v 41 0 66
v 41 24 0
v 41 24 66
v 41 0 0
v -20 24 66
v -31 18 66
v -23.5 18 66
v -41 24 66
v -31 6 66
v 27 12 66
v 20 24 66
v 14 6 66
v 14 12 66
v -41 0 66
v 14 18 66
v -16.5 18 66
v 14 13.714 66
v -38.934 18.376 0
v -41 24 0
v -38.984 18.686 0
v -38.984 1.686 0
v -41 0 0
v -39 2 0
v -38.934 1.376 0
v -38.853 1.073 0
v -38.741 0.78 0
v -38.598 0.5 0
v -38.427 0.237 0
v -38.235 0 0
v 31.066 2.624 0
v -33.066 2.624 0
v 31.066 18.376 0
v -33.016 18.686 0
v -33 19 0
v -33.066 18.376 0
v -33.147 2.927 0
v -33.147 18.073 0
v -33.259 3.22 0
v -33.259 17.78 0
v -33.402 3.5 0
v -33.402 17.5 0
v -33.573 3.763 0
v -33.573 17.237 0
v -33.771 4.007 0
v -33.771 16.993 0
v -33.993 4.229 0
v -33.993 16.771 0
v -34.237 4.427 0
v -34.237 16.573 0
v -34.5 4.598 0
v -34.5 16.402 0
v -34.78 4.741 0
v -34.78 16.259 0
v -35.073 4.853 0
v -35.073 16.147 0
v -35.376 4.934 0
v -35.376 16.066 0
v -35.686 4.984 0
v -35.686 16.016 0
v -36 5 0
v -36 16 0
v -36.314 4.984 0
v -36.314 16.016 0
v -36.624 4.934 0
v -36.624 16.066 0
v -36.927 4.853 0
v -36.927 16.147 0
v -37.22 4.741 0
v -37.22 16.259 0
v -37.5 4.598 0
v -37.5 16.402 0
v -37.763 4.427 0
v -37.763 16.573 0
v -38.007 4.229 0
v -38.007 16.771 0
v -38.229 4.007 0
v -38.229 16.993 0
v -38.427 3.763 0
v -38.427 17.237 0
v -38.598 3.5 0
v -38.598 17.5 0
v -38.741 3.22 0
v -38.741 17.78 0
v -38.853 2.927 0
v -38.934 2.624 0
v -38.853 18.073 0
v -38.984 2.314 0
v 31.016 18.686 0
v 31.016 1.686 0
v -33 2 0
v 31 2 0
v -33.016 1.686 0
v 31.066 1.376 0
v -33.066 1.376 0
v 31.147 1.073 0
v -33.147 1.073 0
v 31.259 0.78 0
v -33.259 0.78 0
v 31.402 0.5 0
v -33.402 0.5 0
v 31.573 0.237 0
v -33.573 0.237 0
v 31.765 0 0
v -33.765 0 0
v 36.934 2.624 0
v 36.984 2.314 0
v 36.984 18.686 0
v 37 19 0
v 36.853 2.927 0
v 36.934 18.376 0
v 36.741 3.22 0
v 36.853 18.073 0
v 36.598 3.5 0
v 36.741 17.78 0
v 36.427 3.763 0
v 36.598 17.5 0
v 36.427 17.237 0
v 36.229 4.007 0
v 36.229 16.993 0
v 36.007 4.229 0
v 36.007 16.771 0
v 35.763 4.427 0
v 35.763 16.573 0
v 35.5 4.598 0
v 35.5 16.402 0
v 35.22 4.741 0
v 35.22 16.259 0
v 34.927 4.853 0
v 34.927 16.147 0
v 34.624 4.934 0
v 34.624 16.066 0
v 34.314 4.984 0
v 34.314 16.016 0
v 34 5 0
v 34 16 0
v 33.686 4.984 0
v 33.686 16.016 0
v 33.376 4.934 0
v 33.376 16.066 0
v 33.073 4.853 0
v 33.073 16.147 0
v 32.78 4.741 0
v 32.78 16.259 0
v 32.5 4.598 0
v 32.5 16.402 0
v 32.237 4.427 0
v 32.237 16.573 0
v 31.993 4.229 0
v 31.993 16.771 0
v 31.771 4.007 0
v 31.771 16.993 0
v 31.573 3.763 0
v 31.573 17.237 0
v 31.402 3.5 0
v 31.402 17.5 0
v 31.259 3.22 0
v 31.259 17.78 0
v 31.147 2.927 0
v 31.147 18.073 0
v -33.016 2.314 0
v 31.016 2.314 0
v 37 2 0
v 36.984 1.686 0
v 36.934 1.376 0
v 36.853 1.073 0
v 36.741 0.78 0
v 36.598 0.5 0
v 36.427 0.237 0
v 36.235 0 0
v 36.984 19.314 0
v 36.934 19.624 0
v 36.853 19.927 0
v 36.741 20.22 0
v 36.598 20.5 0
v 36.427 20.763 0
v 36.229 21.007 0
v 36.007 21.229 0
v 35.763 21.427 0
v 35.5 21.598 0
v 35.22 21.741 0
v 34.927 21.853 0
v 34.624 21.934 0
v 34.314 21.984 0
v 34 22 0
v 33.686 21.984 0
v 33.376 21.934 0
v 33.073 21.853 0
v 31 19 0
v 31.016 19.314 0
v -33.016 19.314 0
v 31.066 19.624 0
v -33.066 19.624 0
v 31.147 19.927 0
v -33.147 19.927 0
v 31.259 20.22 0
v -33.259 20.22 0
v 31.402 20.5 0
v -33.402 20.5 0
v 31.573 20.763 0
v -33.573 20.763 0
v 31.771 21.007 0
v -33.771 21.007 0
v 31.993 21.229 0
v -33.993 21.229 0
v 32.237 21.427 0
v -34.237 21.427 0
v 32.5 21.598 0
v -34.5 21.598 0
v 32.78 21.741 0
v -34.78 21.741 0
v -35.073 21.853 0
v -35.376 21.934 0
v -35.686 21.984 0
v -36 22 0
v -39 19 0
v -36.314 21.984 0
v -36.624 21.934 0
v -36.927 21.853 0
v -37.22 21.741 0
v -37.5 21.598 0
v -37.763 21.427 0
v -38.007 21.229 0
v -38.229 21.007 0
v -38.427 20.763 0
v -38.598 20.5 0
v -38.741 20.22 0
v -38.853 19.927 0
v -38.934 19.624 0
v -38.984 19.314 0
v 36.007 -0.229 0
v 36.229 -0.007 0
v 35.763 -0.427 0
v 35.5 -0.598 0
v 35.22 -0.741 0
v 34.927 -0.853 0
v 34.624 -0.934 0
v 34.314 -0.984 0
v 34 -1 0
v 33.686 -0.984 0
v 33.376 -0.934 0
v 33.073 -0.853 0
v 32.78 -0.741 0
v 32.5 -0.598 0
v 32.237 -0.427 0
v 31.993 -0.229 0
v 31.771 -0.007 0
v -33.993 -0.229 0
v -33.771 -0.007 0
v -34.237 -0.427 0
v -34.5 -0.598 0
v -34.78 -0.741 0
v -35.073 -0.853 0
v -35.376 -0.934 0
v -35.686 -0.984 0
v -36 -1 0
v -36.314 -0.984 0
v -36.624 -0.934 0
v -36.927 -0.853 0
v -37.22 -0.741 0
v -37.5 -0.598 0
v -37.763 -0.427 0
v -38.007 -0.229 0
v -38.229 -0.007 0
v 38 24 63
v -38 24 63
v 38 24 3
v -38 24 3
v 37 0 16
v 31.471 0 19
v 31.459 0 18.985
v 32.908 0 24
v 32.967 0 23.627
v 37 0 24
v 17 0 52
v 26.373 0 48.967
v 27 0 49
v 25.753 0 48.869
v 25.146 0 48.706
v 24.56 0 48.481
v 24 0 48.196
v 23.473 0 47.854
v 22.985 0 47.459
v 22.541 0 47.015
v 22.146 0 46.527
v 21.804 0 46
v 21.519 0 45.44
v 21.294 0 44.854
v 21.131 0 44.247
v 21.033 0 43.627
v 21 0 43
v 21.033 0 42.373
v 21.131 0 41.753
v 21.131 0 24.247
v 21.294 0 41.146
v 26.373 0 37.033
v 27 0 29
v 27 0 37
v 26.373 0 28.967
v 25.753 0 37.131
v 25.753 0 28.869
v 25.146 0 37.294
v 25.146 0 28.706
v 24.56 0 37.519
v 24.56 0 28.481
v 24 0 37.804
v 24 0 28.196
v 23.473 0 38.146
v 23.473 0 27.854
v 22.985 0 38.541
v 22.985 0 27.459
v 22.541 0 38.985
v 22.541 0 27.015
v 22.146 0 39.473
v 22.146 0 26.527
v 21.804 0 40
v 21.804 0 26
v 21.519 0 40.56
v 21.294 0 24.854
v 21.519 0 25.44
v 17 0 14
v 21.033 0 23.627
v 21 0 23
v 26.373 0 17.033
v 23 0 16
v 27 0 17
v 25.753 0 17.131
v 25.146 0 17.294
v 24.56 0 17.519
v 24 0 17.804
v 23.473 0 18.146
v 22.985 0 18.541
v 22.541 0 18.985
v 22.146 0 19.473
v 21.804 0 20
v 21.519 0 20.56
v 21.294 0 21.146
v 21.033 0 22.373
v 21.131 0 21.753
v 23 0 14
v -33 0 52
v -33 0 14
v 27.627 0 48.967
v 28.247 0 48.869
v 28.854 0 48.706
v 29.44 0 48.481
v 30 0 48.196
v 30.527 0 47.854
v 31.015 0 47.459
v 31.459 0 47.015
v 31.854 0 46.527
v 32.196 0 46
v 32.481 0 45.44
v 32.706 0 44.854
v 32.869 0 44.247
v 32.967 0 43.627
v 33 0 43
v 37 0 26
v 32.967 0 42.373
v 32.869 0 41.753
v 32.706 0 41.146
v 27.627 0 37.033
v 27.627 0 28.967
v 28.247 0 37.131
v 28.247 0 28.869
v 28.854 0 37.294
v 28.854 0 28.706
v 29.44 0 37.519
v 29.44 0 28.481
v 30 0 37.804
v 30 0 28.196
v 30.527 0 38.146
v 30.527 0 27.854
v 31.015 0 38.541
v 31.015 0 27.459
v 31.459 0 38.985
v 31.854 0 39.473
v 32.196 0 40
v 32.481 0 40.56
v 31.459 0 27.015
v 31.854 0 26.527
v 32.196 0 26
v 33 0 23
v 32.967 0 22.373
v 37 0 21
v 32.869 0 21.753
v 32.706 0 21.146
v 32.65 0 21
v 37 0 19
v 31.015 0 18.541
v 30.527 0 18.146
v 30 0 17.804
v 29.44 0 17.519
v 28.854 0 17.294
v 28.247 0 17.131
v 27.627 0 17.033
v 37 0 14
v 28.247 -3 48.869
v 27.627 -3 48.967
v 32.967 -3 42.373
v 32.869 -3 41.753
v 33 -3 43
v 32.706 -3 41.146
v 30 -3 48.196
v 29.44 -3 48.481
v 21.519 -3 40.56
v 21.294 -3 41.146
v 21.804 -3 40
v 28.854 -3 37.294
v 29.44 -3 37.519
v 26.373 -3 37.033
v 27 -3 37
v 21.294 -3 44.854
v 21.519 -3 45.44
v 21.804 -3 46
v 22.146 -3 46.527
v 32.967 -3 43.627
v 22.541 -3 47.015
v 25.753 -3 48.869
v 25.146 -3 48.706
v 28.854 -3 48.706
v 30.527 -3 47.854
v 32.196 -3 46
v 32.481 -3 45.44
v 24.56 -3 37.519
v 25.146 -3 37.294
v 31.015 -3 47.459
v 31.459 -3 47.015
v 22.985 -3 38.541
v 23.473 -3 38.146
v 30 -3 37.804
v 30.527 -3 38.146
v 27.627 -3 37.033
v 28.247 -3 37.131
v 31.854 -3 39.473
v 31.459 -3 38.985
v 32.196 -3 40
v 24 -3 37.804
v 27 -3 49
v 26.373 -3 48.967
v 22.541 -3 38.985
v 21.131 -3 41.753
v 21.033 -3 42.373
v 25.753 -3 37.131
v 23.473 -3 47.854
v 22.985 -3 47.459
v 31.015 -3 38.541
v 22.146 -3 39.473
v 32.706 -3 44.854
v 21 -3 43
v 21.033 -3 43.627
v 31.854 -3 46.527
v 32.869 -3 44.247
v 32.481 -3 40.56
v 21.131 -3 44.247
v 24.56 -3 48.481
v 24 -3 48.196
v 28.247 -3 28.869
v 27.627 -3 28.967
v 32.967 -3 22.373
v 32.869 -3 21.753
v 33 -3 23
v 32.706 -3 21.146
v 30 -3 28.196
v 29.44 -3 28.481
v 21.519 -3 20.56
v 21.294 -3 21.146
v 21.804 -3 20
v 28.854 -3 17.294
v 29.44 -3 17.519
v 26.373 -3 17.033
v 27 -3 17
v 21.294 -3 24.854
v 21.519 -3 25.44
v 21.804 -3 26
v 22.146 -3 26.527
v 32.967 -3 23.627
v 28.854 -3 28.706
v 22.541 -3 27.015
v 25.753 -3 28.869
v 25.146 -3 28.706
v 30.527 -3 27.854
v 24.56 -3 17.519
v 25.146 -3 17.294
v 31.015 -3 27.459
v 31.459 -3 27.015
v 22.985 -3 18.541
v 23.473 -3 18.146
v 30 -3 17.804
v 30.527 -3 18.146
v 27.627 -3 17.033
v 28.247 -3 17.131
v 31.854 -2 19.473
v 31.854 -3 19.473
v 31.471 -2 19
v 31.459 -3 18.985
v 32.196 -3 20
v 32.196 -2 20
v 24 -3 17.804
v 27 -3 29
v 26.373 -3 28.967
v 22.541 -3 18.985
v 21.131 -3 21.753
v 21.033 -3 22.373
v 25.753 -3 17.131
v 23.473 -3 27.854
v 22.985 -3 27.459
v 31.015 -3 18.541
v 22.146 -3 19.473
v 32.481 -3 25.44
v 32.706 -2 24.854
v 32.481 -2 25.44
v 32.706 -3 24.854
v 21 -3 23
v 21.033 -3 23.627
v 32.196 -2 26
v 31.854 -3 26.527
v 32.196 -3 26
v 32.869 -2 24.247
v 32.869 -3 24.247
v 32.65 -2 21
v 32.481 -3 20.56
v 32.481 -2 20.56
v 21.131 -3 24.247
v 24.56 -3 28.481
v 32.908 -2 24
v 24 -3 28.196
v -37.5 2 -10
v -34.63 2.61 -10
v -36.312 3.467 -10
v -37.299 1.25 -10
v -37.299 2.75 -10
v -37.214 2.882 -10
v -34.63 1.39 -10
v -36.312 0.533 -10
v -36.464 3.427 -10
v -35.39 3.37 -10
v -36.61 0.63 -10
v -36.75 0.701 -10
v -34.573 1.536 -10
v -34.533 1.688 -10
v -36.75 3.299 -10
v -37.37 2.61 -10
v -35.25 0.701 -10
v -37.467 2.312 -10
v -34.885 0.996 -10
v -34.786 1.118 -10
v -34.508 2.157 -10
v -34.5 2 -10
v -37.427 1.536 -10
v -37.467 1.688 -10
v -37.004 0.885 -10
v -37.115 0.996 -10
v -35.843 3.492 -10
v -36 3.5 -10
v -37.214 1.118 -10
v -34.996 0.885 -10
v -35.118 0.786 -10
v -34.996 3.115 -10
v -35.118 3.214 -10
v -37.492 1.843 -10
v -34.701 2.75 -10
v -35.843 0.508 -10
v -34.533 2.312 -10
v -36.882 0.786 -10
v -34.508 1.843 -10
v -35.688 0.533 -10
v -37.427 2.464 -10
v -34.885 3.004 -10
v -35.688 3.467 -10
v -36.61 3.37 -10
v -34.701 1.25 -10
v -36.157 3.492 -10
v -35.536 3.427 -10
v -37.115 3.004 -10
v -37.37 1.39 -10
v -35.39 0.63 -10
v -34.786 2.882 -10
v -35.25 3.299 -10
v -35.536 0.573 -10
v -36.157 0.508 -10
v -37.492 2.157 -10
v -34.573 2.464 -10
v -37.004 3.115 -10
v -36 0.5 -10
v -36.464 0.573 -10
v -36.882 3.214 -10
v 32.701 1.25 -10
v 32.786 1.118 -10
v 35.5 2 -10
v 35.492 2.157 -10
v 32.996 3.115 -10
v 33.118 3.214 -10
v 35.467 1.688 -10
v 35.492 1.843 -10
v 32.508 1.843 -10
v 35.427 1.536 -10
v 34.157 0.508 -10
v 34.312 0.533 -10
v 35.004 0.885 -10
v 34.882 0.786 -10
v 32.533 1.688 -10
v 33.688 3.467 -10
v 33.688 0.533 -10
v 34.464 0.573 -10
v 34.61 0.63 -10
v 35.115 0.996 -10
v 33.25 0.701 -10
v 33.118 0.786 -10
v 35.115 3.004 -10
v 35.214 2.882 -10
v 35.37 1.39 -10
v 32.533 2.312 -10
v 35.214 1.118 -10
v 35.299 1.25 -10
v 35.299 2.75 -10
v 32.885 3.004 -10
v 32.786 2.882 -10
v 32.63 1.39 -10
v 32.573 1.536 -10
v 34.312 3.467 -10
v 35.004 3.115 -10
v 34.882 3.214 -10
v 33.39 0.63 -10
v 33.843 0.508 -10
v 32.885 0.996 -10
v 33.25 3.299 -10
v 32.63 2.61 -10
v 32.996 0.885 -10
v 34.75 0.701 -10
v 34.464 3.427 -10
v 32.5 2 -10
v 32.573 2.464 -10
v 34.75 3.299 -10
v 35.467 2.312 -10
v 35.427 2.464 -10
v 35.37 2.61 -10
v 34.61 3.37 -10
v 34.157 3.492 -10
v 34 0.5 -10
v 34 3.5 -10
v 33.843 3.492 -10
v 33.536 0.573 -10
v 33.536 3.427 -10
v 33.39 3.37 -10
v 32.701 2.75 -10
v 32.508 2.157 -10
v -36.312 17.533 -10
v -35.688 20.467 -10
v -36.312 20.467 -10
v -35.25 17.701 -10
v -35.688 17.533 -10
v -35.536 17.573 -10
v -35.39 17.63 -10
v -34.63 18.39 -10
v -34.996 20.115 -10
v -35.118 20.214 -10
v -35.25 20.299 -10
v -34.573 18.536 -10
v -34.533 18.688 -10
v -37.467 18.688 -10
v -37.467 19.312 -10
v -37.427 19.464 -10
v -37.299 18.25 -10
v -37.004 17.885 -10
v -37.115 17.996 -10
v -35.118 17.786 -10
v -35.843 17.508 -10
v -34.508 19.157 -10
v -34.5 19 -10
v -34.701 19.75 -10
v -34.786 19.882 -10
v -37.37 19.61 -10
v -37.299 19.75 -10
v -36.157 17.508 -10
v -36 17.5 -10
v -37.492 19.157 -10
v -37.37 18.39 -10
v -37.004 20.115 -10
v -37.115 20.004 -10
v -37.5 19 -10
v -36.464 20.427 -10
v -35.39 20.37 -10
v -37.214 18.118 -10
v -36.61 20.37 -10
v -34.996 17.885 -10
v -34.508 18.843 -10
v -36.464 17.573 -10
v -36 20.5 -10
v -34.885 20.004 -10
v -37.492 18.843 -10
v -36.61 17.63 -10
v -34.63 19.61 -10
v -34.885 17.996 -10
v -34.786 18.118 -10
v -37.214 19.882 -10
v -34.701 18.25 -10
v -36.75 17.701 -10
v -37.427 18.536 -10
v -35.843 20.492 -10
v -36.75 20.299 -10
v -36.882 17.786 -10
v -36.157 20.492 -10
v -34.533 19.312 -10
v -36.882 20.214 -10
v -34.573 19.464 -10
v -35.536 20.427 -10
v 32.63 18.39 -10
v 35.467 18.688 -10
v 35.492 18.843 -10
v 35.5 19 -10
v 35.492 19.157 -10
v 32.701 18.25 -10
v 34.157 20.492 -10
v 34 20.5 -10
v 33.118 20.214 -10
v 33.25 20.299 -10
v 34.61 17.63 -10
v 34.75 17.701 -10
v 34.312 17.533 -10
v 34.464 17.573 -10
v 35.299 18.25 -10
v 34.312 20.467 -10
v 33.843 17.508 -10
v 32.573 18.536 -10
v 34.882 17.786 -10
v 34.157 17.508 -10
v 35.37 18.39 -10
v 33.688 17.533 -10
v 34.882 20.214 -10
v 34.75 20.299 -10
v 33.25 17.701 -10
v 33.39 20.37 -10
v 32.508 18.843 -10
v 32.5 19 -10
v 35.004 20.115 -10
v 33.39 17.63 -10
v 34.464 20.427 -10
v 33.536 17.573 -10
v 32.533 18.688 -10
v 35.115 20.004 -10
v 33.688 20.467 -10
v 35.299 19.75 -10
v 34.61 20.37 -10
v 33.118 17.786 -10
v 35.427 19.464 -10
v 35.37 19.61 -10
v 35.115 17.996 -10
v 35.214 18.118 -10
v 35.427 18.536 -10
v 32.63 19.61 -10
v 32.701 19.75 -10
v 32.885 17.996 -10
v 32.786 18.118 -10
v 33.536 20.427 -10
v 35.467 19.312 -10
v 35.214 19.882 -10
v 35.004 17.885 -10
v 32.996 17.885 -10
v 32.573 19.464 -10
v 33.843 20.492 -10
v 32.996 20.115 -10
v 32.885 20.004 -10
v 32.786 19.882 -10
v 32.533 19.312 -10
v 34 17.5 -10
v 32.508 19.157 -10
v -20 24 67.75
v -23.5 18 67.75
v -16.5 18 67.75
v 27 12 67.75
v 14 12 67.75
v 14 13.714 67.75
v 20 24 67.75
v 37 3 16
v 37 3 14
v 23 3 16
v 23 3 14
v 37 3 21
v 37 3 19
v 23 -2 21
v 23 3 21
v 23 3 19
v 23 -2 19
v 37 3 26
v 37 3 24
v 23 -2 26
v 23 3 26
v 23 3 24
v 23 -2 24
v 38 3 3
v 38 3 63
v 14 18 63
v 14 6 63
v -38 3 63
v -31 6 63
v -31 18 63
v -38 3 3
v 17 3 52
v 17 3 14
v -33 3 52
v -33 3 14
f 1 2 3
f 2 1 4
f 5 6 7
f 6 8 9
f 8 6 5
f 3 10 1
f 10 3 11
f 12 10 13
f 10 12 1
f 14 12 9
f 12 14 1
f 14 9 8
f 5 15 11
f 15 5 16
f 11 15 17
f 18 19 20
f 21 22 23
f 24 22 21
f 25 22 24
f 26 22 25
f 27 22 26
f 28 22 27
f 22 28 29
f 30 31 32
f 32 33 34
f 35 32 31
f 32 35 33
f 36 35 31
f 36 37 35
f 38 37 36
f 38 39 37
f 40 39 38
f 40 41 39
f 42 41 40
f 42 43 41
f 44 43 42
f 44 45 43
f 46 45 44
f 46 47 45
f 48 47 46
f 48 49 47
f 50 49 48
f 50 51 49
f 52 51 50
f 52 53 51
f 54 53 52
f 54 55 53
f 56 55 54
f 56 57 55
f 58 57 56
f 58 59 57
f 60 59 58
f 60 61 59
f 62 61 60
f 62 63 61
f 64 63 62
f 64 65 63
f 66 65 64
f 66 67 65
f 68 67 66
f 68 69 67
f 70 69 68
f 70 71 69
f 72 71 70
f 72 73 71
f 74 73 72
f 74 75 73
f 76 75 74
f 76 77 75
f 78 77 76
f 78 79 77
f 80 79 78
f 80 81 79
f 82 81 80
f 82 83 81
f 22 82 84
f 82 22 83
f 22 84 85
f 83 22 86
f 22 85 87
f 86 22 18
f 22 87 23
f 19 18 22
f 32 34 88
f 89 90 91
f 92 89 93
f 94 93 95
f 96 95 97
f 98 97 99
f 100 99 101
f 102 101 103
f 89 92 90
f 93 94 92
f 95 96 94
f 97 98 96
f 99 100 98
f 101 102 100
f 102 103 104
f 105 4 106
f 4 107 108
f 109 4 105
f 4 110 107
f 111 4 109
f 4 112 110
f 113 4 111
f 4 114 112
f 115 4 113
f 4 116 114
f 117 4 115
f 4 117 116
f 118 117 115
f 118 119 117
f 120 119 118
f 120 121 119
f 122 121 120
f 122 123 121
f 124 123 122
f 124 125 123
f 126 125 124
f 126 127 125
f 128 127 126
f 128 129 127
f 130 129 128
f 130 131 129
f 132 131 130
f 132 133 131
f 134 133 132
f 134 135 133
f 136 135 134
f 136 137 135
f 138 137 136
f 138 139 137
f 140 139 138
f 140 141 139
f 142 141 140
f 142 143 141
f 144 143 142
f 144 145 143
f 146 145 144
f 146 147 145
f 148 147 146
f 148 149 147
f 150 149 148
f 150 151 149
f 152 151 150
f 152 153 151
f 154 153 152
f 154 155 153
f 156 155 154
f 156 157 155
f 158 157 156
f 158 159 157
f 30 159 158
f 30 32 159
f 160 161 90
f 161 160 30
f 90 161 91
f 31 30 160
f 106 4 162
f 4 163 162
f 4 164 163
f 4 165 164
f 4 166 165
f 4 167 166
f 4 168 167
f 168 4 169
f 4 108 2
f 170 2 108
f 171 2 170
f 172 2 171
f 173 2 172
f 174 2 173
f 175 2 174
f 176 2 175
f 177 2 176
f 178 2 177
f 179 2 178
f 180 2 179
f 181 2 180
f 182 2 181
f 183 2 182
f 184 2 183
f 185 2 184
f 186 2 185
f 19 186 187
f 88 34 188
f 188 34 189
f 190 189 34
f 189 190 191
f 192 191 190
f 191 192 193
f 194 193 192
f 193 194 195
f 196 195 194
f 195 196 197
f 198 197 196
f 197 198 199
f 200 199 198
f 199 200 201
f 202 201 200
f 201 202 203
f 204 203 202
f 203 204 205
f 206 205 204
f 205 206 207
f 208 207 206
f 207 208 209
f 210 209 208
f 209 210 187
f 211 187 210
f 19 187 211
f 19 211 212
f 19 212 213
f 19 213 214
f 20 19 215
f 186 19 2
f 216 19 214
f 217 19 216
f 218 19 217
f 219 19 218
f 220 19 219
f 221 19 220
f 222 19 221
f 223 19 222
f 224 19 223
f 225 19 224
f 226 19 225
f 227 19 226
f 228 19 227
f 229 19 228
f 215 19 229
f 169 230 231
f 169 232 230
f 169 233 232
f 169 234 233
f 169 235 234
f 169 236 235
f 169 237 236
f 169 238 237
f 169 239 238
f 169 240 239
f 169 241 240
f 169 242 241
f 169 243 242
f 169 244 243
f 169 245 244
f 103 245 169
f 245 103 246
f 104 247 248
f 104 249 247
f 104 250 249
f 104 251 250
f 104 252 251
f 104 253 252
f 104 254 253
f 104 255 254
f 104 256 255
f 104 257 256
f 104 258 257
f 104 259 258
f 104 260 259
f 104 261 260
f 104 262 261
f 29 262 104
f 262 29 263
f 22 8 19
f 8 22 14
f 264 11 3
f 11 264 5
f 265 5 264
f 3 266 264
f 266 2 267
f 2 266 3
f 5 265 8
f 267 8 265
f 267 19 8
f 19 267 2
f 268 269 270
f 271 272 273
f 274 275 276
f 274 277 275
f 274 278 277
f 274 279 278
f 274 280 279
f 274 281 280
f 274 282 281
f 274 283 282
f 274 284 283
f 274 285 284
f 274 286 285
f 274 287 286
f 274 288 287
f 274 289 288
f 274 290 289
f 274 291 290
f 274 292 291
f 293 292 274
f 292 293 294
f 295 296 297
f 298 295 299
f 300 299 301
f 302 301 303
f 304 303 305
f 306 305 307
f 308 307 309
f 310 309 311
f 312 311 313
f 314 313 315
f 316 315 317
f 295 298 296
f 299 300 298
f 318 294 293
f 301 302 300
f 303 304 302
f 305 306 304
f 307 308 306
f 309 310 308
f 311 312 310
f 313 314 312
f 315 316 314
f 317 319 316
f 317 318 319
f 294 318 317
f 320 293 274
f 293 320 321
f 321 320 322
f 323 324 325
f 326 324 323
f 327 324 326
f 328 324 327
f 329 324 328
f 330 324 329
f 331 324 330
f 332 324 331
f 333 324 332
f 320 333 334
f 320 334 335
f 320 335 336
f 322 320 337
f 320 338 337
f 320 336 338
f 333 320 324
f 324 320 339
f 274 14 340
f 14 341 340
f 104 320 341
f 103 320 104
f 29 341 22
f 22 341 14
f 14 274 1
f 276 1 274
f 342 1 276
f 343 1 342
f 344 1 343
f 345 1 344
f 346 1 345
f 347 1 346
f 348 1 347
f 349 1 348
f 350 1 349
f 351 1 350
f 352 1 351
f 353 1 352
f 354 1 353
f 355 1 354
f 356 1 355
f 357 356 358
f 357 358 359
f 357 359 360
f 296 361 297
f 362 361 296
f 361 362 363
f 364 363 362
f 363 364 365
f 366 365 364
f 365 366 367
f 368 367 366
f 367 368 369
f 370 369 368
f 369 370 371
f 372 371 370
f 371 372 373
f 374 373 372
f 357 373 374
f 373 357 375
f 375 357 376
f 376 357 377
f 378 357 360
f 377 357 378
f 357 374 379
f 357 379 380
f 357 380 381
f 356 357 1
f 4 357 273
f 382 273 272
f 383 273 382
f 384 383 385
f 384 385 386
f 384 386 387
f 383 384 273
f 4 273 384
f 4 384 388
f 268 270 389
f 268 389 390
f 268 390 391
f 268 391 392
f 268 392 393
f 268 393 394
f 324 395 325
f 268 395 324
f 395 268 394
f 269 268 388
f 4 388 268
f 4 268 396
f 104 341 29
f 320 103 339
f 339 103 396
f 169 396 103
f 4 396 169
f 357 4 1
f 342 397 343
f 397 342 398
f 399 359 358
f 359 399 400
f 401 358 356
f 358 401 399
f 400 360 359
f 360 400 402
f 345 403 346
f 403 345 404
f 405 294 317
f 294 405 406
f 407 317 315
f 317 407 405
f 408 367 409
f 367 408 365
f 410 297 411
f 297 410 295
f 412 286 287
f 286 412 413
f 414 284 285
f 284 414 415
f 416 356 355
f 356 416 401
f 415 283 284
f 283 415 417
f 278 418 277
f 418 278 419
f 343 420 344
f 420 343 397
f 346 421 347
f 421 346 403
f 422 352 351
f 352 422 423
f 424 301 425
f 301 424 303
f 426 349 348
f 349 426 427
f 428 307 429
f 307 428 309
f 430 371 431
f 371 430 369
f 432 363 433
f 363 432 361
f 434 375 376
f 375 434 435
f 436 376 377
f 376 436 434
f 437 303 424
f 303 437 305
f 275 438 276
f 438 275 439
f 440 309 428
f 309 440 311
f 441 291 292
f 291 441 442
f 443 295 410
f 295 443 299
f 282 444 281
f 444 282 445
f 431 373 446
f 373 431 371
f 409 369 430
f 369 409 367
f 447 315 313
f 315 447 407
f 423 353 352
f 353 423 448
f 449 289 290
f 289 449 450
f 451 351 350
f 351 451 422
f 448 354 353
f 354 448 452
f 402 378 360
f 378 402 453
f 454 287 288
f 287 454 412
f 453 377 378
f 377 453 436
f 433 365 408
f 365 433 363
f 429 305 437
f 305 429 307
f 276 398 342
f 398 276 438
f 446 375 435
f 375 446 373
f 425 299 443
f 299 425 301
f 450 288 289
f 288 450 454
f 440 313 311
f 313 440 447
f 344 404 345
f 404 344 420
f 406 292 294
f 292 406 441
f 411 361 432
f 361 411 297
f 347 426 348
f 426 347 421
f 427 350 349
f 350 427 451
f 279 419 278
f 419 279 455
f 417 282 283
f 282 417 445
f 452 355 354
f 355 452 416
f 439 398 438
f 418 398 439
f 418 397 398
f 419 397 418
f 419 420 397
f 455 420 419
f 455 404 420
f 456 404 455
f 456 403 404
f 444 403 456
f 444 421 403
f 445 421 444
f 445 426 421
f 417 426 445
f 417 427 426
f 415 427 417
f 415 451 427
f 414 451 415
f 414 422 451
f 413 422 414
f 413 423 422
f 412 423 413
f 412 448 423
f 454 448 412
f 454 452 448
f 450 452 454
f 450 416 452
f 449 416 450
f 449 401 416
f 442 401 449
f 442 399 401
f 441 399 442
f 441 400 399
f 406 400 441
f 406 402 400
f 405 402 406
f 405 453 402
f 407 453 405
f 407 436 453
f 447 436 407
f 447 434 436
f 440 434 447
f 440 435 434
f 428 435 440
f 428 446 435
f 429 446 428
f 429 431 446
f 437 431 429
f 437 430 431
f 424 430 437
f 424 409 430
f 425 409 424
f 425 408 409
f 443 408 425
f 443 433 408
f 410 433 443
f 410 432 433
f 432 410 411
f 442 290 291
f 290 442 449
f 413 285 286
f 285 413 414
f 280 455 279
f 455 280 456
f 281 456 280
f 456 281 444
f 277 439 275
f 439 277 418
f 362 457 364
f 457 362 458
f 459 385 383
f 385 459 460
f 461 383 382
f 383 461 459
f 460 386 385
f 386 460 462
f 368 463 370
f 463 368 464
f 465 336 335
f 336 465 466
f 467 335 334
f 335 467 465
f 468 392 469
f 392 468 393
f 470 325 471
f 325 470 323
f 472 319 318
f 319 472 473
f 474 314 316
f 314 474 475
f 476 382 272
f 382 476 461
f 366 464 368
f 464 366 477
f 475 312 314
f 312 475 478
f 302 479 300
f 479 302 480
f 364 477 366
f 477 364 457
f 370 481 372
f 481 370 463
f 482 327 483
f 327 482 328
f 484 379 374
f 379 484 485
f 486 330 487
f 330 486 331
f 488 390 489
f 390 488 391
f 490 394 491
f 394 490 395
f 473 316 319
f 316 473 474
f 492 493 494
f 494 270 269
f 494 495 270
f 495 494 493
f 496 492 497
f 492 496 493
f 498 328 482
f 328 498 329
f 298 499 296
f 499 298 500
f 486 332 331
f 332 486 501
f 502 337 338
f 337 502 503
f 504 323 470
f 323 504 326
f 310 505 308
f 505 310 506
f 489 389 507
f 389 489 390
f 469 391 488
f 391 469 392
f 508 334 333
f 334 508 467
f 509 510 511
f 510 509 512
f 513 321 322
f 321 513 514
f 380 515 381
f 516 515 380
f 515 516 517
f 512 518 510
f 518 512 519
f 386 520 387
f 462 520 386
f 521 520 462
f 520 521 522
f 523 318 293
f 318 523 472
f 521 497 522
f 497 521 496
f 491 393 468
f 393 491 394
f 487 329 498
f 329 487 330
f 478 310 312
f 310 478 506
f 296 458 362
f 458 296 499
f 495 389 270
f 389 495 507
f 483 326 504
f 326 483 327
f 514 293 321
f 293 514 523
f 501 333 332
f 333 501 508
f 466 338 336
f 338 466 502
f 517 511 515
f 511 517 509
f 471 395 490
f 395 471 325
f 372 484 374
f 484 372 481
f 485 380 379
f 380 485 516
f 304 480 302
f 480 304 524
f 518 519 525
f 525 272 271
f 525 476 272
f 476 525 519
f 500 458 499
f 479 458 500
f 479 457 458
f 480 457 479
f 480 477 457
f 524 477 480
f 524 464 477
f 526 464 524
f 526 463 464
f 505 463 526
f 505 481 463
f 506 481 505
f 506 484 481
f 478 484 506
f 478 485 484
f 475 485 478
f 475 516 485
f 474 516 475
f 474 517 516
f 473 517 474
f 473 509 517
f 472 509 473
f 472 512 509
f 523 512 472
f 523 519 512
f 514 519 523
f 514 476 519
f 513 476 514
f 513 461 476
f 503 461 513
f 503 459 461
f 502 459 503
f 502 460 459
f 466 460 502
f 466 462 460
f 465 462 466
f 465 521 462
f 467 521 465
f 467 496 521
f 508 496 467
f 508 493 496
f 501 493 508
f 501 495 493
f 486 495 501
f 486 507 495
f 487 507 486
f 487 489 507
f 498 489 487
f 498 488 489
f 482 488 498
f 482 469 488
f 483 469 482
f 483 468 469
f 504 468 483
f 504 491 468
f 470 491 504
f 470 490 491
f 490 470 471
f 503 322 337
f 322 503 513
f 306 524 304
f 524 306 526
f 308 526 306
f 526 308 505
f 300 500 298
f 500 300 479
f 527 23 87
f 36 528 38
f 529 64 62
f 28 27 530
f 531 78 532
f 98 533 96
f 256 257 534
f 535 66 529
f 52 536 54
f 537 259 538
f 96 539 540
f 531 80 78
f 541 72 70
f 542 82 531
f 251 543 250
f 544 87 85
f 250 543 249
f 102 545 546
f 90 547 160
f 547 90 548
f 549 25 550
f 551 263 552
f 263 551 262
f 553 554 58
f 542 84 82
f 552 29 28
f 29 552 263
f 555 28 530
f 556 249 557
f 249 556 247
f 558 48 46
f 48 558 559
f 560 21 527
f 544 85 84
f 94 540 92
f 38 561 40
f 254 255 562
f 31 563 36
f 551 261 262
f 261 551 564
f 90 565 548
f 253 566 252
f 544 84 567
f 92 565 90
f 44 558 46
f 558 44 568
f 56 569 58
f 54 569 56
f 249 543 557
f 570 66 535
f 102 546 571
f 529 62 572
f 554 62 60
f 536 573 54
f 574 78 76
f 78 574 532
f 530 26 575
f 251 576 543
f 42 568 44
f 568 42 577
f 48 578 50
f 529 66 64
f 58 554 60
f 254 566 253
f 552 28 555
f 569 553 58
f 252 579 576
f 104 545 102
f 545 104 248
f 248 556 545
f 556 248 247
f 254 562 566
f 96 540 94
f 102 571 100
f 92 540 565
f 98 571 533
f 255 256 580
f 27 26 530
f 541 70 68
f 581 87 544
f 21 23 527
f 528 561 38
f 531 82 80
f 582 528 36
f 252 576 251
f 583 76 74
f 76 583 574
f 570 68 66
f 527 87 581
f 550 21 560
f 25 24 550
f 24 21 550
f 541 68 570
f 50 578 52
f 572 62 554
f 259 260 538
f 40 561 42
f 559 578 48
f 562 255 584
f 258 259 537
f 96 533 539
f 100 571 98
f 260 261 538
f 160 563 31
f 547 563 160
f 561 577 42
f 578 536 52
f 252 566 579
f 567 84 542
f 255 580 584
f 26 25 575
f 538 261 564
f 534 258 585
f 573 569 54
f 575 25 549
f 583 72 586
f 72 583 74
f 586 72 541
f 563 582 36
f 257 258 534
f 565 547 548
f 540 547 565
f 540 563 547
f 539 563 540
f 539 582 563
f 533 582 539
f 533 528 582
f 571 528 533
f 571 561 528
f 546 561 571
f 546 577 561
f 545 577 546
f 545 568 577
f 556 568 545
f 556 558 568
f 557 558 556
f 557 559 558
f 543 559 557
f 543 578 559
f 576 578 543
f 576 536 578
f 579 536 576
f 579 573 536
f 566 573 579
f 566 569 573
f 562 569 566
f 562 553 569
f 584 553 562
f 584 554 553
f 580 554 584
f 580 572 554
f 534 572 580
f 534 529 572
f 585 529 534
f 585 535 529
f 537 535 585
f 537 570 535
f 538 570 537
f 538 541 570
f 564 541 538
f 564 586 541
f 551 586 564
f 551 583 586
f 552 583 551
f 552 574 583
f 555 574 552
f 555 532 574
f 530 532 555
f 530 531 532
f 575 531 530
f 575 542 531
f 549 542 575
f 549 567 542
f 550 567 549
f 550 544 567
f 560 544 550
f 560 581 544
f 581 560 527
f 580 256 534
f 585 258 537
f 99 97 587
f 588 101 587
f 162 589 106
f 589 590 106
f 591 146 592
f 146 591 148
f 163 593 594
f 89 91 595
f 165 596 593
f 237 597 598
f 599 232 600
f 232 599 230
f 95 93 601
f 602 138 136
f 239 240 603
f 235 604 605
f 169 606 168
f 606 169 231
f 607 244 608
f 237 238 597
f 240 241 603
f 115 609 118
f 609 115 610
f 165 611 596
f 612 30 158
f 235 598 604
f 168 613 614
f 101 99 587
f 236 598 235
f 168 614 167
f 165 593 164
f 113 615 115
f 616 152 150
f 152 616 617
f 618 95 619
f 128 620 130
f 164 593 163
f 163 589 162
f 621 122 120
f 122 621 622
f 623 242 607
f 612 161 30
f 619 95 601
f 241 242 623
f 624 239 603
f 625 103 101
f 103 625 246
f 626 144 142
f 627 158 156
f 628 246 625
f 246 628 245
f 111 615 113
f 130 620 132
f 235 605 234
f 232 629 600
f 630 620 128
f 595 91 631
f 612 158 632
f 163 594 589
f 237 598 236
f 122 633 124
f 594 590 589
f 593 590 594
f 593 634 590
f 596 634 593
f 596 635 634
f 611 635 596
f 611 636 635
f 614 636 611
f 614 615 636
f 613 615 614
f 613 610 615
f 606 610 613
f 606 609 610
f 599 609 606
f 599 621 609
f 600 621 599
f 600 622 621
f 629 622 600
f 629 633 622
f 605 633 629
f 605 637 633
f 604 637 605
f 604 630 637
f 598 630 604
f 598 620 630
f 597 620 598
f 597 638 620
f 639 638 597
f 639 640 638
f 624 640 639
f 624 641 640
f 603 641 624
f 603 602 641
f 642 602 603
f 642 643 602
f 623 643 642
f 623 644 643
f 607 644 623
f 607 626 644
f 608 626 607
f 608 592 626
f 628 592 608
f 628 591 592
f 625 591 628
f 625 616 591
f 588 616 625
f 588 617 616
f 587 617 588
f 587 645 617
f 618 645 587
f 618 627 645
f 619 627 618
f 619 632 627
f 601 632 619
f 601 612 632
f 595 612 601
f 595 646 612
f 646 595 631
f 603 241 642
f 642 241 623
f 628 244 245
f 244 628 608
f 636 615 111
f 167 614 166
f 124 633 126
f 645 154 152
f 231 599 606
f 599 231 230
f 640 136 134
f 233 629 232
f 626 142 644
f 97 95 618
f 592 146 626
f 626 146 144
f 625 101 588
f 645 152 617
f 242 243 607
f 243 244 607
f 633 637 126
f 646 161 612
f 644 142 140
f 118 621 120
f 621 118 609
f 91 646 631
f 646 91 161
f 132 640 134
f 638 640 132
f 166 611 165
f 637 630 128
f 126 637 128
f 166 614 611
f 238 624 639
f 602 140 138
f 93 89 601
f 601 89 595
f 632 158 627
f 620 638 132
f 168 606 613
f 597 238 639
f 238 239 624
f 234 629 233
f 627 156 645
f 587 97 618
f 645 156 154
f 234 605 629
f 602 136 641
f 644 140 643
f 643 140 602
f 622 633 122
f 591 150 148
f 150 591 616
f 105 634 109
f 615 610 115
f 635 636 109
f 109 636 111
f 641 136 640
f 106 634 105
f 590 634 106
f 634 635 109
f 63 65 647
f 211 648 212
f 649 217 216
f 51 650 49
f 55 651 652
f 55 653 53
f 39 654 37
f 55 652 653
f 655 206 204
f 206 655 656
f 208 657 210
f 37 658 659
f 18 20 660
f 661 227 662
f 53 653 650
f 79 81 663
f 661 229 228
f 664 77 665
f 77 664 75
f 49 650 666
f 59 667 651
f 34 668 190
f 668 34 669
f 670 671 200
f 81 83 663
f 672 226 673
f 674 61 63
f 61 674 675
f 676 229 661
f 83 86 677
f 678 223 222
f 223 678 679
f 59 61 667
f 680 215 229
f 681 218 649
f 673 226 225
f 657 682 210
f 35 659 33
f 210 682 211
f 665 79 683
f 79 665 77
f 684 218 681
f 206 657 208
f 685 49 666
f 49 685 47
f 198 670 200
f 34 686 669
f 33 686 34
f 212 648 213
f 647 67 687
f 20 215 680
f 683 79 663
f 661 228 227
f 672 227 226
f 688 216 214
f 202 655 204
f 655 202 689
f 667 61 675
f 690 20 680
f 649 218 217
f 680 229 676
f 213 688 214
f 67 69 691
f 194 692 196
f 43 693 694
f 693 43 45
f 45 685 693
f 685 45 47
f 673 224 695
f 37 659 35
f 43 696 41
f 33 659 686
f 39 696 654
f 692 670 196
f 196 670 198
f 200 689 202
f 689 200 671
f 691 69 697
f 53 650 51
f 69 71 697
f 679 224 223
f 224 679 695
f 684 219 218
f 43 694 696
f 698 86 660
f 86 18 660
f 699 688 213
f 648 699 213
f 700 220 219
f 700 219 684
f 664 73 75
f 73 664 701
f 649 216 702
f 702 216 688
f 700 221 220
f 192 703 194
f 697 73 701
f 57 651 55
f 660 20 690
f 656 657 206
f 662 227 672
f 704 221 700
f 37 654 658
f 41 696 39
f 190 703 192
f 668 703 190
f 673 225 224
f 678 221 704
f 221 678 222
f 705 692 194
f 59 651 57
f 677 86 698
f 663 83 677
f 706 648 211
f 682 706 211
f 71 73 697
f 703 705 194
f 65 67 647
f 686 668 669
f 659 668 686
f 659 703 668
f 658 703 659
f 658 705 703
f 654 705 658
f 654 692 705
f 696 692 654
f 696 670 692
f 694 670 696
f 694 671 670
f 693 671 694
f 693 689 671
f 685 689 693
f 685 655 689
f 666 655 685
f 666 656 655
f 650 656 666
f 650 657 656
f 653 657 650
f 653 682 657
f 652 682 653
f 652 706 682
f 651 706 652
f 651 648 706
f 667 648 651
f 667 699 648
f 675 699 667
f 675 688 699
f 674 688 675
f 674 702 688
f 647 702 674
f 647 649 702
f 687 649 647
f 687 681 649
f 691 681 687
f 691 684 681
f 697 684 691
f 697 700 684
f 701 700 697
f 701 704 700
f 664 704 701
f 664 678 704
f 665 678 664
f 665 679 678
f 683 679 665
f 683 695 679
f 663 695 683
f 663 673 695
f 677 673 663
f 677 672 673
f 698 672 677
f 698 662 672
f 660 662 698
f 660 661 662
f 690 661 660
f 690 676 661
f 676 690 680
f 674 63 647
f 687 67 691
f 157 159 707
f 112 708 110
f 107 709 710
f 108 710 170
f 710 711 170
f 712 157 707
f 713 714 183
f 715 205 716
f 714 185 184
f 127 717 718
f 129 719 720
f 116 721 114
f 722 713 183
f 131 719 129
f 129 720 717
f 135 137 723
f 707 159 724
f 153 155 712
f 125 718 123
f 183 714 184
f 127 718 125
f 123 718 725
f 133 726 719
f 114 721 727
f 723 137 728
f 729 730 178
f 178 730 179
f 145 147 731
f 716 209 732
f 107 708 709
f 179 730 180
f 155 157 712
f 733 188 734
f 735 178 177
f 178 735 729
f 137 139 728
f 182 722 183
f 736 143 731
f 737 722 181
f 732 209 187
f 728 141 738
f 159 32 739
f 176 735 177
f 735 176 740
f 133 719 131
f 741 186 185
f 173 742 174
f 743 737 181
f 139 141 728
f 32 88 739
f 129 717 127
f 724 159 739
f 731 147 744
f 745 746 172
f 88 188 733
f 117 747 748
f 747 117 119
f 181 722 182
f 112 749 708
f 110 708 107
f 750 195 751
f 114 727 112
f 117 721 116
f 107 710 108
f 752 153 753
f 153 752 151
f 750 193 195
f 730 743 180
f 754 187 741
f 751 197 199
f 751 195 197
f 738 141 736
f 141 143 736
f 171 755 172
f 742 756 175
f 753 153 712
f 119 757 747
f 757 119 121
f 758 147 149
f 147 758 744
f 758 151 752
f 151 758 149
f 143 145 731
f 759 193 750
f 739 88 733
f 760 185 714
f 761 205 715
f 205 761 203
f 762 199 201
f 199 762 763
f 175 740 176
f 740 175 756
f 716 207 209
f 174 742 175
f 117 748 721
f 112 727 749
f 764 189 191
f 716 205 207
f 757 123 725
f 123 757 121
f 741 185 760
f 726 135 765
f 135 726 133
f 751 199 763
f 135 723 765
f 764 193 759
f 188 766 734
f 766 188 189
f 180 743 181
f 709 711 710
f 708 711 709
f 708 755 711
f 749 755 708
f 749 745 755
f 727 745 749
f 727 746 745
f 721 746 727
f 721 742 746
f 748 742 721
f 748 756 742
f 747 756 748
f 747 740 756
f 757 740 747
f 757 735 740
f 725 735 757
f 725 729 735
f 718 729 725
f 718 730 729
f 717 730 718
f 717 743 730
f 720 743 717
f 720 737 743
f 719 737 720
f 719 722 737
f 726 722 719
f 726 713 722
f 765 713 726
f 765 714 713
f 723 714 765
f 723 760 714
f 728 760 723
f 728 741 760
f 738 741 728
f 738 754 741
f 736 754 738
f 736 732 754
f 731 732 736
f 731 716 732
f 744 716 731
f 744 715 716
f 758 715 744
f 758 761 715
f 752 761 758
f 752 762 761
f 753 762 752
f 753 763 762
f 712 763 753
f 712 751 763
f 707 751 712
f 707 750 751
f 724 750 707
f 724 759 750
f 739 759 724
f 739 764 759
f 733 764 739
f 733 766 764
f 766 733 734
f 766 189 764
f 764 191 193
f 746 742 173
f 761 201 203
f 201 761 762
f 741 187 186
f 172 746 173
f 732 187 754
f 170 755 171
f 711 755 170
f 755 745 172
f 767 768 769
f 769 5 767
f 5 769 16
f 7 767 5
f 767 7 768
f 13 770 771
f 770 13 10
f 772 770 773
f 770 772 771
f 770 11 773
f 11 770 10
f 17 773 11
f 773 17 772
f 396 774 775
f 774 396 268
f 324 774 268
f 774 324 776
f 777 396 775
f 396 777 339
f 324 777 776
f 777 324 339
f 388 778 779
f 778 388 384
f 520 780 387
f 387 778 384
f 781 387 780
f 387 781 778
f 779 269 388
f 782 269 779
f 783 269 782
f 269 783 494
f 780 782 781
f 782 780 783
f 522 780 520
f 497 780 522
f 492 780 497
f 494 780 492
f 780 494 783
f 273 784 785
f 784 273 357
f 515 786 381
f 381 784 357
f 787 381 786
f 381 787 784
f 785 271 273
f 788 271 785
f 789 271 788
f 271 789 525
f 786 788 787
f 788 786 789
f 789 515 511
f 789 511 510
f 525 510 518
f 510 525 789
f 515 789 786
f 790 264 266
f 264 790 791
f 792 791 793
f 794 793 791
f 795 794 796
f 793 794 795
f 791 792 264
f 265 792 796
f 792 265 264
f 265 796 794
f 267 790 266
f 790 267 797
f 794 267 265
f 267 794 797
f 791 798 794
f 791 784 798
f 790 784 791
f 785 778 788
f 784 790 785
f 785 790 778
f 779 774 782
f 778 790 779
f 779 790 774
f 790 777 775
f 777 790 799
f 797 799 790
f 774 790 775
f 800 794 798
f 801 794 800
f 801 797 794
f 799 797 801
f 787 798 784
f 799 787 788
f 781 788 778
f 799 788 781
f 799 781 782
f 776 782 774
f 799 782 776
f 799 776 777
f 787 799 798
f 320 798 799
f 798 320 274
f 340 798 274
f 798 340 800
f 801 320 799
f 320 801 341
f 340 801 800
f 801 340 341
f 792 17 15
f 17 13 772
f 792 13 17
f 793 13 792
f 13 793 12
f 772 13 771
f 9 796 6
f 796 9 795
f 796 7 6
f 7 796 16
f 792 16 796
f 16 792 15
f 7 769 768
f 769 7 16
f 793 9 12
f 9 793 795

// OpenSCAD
// ==============================================================================
// Wio Terminal 复古迷你 CRT 小电视 / 萌宠猫耳外壳 (Retro CRT TV & Desk Pet Bezel)
// 专为“小维”AI 电子桌宠像素小屋打造的复古极客外壳
// 带有复古显像管曲面边框、复古旋钮、独立倾角脚撑与猫咪耳朵
// ==============================================================================

$fn = 60;

tv_w = 82.0;
tv_h = 66.0;
tv_d = 24.0;
wall = 3.0;

module retro_tv() {
    difference() {
        // 主壳体
        union() {
            // 电视机主体倒角方盒
            translate([-tv_w/2, 0, 0])
                cube([tv_w, tv_d, tv_h]);

            // 右侧复古双旋转旋钮
            translate([tv_w/2 - 14, -3, tv_h/2 + 10])
                rotate([-90, 0, 0])
                    cylinder(d = 12, h = 3);
            translate([tv_w/2 - 14, -3, tv_h/2 - 10])
                rotate([-90, 0, 0])
                    cylinder(d = 12, h = 3);

            // 4 只复古小电视斜撑脚
            translate([-tv_w/2 + 5, 2, -10]) cylinder(d1=3, d2=6, h=10);
            translate([ tv_w/2 - 7, 2, -10]) cylinder(d1=3, d2=6, h=10);
            translate([-tv_w/2 + 5, tv_d - 5, -10]) cylinder(d1=3, d2=6, h=10);
            translate([ tv_w/2 - 7, tv_d - 5, -10]) cylinder(d1=3, d2=6, h=10);

            // 顶部萌系猫咪双耳
            translate([-20, tv_d/2, tv_h])
                rotate([0, 0, 0])
                    linear_extrude(height = 3.5, center = true)
                        polygon([[-7, 0], [7, 0], [0, 12]]);

            translate([ 20, tv_d/2, tv_h])
                rotate([0, 0, 0])
                    linear_extrude(height = 3.5, center = true)
                        polygon([[-7, 0], [7, 0], [0, 12]]);
        }

        // 内部容纳槽 (用于插入 Wio Terminal: 73mm x 58mm x 13mm)
        translate([-tv_w/2 + wall, wall, wall])
            cube([tv_w - 2*wall, tv_d, tv_h - 2*wall]);

        // 正面 CRT 显示屏开窗 (50mm x 38mm，匹配 2.4 寸屏幕)
        translate([-tv_w/2 + 8, -2, (tv_h - 38)/2])
            cube([50, wall + 4, 38]);

        // 右下角复古发声孔槽
        for (i = [0:2]) {
            translate([tv_w/2 - 18, -2, (tv_h - 38)/2 + i*5])
                cube([14, wall + 4, 2]);
        }

        // 顶部三键与摇杆避空开槽
        translate([-tv_w/2 + 10, tv_d/2 - 6, tv_h - wall - 1])
            cube([45, 12, wall + 3]);
    }
}

retro_tv();
